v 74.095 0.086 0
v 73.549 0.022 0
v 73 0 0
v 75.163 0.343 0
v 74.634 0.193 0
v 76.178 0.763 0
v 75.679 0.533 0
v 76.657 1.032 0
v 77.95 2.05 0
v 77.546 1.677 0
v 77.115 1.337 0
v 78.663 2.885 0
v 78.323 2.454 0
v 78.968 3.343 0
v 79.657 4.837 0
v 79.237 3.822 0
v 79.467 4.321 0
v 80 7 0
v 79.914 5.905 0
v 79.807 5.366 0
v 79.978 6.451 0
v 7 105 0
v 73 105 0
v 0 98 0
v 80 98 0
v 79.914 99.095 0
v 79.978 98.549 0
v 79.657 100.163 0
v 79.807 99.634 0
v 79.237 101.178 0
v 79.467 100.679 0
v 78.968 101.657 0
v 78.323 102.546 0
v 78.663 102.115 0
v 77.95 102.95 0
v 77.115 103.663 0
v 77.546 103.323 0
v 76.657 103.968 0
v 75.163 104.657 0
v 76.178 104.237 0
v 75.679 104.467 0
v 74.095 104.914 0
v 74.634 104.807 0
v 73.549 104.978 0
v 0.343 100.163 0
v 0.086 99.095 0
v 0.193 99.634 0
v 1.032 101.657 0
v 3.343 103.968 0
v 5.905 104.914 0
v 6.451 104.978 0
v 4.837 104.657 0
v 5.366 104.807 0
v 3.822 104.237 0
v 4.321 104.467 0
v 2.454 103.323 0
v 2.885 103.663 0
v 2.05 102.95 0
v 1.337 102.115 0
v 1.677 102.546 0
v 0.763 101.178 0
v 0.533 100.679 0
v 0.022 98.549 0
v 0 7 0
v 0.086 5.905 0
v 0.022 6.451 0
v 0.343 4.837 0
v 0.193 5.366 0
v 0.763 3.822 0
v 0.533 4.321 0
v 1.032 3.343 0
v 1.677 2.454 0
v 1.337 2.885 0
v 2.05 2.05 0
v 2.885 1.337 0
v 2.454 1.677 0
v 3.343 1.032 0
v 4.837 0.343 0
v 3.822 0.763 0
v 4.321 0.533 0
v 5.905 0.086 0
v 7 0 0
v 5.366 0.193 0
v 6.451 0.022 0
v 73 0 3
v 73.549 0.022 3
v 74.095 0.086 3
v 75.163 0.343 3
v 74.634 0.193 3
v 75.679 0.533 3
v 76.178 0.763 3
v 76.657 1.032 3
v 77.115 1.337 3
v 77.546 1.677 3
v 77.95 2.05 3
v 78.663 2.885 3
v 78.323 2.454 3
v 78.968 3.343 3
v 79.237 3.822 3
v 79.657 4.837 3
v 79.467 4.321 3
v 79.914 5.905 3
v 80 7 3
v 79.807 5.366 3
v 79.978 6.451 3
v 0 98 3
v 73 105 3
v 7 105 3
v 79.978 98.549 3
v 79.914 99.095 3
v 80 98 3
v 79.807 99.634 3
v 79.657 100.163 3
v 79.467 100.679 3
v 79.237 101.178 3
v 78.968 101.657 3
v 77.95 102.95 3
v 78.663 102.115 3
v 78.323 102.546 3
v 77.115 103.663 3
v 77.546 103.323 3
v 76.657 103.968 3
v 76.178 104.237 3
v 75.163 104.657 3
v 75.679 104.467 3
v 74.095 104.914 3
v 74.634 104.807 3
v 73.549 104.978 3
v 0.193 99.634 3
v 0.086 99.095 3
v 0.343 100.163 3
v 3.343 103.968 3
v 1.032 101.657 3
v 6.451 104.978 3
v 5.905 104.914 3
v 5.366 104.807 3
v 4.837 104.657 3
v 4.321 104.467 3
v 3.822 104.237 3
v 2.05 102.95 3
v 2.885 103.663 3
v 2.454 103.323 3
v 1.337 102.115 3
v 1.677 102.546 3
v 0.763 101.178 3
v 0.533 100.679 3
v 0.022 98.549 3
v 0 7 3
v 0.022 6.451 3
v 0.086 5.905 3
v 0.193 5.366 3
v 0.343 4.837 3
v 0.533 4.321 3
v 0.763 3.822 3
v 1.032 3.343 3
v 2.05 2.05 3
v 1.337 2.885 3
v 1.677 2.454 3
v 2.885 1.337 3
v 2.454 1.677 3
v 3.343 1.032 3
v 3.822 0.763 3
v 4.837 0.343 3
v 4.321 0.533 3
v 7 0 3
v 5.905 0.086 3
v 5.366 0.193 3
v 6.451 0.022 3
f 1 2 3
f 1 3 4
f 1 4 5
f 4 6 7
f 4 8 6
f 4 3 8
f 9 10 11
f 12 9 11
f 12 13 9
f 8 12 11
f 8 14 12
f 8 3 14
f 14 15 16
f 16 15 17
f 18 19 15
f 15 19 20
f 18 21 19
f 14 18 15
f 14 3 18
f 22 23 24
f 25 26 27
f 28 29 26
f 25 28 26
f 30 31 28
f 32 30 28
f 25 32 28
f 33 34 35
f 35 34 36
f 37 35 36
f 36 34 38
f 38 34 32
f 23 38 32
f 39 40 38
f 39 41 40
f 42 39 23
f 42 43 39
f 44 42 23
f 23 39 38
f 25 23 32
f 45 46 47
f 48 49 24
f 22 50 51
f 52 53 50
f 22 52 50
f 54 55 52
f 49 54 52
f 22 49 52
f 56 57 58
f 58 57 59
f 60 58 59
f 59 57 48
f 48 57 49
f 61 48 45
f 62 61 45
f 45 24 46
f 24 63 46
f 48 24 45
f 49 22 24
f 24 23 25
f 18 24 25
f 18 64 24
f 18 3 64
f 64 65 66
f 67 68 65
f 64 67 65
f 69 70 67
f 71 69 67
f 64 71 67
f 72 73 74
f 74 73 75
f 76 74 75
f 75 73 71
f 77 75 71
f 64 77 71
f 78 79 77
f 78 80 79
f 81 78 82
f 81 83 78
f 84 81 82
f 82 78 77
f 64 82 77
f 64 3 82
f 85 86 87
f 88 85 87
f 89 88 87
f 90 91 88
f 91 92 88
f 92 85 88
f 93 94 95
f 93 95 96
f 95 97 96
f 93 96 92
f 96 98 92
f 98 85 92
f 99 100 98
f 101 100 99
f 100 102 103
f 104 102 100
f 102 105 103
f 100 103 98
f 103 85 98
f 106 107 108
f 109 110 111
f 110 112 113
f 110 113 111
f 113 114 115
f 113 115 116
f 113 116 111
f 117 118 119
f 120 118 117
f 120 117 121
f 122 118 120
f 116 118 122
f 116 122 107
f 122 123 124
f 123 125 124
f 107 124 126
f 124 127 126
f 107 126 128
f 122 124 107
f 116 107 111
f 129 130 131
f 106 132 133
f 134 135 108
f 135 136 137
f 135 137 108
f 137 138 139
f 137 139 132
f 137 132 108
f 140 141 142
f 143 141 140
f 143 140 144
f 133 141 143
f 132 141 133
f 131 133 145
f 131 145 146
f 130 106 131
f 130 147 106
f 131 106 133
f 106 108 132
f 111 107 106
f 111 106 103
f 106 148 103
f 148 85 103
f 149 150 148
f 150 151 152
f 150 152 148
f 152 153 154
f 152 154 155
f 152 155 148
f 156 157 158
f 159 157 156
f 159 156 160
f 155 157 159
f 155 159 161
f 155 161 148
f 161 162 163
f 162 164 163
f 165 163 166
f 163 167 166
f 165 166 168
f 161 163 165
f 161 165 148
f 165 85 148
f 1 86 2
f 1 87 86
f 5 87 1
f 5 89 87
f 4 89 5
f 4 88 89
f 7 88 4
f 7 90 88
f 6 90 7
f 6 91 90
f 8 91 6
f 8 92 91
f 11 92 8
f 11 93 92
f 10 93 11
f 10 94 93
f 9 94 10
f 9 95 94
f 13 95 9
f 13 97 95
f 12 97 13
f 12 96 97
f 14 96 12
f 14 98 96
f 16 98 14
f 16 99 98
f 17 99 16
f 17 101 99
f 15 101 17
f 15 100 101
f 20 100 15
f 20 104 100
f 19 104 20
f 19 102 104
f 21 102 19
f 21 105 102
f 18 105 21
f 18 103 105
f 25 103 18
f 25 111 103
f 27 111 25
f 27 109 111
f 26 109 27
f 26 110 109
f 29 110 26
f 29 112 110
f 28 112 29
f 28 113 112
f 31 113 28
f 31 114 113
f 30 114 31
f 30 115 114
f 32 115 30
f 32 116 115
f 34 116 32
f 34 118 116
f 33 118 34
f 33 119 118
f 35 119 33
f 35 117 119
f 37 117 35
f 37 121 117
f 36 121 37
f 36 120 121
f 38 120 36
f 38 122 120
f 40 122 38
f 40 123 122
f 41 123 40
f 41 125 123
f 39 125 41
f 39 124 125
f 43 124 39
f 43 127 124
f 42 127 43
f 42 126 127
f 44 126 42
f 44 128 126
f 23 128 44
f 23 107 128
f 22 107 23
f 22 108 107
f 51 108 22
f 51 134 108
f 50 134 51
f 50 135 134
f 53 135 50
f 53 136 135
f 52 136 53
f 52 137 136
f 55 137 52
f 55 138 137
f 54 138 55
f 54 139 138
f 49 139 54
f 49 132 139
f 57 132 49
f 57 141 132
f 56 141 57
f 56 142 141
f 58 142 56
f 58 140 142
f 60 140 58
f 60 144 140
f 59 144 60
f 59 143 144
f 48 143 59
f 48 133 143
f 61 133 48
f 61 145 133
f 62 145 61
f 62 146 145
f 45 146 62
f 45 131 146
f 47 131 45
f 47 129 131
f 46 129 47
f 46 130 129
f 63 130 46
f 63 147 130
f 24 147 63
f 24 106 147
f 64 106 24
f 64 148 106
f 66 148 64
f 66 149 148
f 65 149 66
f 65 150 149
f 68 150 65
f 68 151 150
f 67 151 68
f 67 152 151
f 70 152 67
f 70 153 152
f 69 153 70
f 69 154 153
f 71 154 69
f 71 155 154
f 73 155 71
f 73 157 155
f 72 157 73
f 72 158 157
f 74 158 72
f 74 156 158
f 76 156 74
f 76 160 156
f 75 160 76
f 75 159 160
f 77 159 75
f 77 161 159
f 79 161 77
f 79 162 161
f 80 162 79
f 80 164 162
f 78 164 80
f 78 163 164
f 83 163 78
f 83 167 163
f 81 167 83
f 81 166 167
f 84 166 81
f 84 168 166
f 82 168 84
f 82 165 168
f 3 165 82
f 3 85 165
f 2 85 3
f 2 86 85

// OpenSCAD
$fn = 80;

largura = 80;
altura = 105;
espessura_base = 3;
raio_canto = 7;

module retangulo_arredondado_2d(largura, altura, raio) {
    translate([raio, raio])
    offset(r = raio)
    square([largura - 2 * raio, altura - 2 * raio]);
}

linear_extrude(height = espessura_base)
retangulo_arredondado_2d(largura, altura, raio_canto);
